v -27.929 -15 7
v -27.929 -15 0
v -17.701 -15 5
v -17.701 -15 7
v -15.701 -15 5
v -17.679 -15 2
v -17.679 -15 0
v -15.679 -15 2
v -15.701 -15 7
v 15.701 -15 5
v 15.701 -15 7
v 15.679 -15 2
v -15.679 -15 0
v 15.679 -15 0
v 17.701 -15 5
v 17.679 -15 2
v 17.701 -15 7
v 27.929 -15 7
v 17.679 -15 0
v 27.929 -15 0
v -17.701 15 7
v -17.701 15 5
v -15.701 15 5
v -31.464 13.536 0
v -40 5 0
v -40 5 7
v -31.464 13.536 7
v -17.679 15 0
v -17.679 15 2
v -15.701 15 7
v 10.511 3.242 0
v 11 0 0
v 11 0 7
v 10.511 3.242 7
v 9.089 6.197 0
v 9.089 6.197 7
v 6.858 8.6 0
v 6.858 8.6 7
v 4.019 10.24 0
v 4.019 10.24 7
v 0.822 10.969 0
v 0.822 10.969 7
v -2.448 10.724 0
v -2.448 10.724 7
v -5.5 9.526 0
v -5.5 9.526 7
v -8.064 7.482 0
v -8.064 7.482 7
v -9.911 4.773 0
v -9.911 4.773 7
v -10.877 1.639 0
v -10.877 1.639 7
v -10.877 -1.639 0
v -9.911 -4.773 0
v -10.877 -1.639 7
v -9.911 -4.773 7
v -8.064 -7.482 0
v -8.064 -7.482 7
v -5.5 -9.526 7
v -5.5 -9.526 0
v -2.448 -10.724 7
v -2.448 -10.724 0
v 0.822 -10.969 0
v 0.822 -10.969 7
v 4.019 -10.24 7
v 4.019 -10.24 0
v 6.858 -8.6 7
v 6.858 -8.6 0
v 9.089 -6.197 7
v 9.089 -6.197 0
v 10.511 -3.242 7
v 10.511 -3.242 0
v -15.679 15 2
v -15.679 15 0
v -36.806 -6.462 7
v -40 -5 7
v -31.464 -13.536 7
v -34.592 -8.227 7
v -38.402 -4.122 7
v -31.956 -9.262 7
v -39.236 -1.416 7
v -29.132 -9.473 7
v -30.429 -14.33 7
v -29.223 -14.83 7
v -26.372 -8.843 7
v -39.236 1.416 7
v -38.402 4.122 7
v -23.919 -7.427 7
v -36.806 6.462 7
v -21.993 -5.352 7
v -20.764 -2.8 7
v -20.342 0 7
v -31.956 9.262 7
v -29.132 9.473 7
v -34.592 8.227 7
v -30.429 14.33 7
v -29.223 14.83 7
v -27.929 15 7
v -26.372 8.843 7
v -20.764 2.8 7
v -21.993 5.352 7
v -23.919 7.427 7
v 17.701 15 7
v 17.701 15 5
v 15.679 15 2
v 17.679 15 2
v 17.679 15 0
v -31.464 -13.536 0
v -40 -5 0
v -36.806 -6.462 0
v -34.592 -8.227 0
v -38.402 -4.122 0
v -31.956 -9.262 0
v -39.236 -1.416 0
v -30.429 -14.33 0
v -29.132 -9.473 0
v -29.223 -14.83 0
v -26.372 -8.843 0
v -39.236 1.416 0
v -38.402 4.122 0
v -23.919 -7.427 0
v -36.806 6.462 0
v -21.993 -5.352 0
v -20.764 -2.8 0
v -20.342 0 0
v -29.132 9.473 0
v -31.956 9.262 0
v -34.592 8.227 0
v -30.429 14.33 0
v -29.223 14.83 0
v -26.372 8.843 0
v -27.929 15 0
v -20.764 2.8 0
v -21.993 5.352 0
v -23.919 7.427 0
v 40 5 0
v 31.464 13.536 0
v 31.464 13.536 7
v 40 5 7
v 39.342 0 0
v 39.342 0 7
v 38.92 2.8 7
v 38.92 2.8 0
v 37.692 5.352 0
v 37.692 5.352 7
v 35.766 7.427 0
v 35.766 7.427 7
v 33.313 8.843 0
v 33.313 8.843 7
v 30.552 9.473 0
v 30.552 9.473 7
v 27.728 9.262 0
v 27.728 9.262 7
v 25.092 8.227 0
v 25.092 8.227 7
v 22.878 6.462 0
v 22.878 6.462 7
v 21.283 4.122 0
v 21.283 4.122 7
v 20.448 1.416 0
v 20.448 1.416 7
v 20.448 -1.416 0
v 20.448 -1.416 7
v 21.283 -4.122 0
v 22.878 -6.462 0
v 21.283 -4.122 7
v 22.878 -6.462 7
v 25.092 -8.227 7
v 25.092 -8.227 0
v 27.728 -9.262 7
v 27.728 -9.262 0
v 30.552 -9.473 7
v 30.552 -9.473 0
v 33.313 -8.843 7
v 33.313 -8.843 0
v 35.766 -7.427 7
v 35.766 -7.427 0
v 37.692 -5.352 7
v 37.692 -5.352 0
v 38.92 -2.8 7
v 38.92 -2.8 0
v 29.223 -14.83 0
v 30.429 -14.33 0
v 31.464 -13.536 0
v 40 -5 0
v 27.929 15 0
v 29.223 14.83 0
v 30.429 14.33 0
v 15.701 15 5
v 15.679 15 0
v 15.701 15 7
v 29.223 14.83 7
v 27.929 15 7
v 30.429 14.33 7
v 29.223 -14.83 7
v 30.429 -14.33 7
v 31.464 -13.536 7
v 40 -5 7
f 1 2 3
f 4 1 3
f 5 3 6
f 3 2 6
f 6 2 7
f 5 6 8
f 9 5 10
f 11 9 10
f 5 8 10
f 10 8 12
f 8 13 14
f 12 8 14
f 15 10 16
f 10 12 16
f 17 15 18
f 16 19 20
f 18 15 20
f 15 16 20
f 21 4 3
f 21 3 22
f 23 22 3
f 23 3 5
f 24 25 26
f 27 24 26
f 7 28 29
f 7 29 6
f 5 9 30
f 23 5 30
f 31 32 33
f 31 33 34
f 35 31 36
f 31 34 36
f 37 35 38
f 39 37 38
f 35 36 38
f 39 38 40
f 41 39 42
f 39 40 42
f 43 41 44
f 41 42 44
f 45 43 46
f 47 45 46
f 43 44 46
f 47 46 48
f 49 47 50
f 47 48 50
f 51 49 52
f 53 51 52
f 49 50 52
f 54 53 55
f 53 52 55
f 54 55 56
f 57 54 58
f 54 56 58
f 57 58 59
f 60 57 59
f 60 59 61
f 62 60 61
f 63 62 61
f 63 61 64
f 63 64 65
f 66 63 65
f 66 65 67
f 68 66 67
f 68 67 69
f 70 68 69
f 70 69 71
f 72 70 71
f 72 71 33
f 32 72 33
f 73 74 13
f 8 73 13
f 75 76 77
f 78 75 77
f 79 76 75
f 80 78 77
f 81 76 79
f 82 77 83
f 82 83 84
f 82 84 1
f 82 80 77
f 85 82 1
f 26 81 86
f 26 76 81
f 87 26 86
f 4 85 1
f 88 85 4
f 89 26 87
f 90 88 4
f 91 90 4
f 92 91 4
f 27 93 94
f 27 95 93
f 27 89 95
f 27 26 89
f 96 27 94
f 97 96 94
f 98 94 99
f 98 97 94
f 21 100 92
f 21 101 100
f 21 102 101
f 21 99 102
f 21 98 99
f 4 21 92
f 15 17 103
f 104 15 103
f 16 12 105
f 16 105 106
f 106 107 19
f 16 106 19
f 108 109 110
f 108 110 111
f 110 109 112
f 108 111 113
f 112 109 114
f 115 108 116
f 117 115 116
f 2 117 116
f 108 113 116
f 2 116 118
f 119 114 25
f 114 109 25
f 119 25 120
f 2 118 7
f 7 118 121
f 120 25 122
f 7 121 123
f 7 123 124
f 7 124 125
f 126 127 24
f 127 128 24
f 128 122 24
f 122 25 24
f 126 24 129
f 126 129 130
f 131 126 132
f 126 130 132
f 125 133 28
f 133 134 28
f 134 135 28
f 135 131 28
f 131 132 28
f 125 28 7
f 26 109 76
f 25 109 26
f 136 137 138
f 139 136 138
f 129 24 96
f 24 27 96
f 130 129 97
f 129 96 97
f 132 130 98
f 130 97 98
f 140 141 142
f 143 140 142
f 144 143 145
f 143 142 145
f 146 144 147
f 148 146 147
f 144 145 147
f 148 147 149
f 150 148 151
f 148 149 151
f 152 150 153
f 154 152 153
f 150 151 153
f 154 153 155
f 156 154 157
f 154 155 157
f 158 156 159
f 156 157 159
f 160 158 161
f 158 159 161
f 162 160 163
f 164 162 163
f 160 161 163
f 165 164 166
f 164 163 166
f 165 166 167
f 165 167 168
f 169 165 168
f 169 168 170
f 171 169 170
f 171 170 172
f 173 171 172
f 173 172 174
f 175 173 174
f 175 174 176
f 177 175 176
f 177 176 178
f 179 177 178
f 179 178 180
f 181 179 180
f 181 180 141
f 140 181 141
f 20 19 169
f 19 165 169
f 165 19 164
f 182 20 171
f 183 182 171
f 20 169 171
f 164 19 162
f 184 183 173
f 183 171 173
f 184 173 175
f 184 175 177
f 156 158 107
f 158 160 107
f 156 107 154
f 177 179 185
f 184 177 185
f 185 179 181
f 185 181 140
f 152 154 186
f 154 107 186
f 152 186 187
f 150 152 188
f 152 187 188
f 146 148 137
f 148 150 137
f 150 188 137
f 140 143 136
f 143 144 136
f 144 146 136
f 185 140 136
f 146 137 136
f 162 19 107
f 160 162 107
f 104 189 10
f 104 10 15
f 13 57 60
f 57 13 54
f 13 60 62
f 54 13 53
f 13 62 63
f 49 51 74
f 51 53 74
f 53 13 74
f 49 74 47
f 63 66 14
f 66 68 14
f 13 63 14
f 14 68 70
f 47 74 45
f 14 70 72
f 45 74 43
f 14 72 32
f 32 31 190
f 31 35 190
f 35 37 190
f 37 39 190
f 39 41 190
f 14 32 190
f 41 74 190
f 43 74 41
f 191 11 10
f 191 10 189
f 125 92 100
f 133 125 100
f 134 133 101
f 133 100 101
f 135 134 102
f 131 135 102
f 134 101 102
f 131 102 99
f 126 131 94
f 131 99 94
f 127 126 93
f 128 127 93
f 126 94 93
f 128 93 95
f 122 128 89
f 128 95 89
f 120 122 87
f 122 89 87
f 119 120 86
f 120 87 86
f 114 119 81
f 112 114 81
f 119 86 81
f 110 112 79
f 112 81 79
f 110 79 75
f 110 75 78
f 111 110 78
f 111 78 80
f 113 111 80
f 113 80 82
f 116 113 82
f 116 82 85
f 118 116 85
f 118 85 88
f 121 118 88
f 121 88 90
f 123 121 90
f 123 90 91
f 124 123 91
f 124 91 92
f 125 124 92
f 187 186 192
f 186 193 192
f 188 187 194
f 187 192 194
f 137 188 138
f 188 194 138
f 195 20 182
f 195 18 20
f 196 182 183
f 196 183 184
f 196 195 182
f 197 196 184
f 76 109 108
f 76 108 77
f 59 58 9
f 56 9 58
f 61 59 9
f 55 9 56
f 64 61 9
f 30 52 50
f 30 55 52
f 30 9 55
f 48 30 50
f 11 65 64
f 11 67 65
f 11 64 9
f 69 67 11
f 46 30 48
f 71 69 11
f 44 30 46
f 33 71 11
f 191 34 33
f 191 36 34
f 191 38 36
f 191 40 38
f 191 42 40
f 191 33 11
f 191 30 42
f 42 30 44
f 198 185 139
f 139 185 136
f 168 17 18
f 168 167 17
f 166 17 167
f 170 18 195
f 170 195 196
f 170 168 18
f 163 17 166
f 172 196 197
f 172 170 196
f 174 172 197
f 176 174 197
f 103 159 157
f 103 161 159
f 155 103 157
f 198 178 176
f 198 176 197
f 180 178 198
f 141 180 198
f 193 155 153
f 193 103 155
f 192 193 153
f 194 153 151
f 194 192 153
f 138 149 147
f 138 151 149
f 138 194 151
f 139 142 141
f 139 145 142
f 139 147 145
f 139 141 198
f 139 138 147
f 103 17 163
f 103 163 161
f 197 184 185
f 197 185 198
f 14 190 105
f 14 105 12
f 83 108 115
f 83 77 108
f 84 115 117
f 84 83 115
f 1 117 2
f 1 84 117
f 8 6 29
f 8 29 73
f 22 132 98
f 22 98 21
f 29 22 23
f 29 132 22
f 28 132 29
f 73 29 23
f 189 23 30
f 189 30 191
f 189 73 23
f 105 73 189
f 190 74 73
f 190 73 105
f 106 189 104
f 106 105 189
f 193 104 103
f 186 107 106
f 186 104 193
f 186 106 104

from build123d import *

# Parameters (mm, degrees)
F0_W      = 80
F0_H      = 30
F1_DEPTH  = 7
F2_R      = 11
F3_DEPTH  = 7.001
F4_SIZE   = 10
F5_R      = 5
F6_R      = 9.5
F7_DEPTH  = 7.001
F8_W      = 2
F8_H      = 30
F9_DEPTH  = 2
F10_W     = 2
F10_H     = 30
F11_DEPTH = 2


with BuildPart() as f1:
    # F0 (on Top) → F1 (new body)
    with BuildSketch(Plane.XY):
        Rectangle(F0_W, F0_H)
    extrude(amount=F1_DEPTH)

    # F2 (on face) → F3 (cut, through all)
    with BuildSketch(Plane.XY.offset(7)):
        Circle(F2_R)
    extrude(amount=-F3_DEPTH, mode=Mode.SUBTRACT)

    # F4
    f4_edges = [f1.edges().sort_by_distance(p)[0] for p in [
        (-40, 15, 3.5),
        (40, -15, 3.5),
        (40, 15, 3.5),
        (-40, -15, 3.5),
    ]]
    chamfer(f4_edges, length=F4_SIZE)

    # F5
    f5_edges = [f1.edges().sort_by_distance(p)[0] for p in [
        (-30, 15, 3.5),
        (-30, -15, 3.5),
        (30, -15, 3.5),
        (30, 15, 3.5),
    ]]
    fillet(f5_edges, radius=F5_R)

    # F6 (on face) → F7 (cut, through all)
    with BuildSketch(Plane.XY.offset(7)):
        with Locations((29.84234935, 0)):
            Circle(F6_R)
        with Locations((-29.84234935, 0)):
            Circle(F6_R)
    extrude(amount=-F7_DEPTH, mode=Mode.SUBTRACT)

    # F8 (on face) → F9 (cut)
    with BuildSketch(Plane.XY.offset(7)):
        with Locations((16.7006367594, 0)):
            Rectangle(F8_W, F8_H)
        with Locations((-16.7006367594, 0)):
            Rectangle(F8_W, F8_H)
    extrude(amount=-F9_DEPTH, mode=Mode.SUBTRACT)

    # F10 (on face) → F11 (cut)
    with BuildSketch(Plane(origin=(0, 0, 0), x_dir=(1, 0, 0), z_dir=(0, 0, -1))):
        with Locations((16.6785700023, 0)):
            Rectangle(F10_W, F10_H)
        with Locations((-16.6785700023, 0)):
            Rectangle(F10_W, F10_H)
    extrude(amount=-F11_DEPTH, mode=Mode.SUBTRACT)


solid = f1.part
